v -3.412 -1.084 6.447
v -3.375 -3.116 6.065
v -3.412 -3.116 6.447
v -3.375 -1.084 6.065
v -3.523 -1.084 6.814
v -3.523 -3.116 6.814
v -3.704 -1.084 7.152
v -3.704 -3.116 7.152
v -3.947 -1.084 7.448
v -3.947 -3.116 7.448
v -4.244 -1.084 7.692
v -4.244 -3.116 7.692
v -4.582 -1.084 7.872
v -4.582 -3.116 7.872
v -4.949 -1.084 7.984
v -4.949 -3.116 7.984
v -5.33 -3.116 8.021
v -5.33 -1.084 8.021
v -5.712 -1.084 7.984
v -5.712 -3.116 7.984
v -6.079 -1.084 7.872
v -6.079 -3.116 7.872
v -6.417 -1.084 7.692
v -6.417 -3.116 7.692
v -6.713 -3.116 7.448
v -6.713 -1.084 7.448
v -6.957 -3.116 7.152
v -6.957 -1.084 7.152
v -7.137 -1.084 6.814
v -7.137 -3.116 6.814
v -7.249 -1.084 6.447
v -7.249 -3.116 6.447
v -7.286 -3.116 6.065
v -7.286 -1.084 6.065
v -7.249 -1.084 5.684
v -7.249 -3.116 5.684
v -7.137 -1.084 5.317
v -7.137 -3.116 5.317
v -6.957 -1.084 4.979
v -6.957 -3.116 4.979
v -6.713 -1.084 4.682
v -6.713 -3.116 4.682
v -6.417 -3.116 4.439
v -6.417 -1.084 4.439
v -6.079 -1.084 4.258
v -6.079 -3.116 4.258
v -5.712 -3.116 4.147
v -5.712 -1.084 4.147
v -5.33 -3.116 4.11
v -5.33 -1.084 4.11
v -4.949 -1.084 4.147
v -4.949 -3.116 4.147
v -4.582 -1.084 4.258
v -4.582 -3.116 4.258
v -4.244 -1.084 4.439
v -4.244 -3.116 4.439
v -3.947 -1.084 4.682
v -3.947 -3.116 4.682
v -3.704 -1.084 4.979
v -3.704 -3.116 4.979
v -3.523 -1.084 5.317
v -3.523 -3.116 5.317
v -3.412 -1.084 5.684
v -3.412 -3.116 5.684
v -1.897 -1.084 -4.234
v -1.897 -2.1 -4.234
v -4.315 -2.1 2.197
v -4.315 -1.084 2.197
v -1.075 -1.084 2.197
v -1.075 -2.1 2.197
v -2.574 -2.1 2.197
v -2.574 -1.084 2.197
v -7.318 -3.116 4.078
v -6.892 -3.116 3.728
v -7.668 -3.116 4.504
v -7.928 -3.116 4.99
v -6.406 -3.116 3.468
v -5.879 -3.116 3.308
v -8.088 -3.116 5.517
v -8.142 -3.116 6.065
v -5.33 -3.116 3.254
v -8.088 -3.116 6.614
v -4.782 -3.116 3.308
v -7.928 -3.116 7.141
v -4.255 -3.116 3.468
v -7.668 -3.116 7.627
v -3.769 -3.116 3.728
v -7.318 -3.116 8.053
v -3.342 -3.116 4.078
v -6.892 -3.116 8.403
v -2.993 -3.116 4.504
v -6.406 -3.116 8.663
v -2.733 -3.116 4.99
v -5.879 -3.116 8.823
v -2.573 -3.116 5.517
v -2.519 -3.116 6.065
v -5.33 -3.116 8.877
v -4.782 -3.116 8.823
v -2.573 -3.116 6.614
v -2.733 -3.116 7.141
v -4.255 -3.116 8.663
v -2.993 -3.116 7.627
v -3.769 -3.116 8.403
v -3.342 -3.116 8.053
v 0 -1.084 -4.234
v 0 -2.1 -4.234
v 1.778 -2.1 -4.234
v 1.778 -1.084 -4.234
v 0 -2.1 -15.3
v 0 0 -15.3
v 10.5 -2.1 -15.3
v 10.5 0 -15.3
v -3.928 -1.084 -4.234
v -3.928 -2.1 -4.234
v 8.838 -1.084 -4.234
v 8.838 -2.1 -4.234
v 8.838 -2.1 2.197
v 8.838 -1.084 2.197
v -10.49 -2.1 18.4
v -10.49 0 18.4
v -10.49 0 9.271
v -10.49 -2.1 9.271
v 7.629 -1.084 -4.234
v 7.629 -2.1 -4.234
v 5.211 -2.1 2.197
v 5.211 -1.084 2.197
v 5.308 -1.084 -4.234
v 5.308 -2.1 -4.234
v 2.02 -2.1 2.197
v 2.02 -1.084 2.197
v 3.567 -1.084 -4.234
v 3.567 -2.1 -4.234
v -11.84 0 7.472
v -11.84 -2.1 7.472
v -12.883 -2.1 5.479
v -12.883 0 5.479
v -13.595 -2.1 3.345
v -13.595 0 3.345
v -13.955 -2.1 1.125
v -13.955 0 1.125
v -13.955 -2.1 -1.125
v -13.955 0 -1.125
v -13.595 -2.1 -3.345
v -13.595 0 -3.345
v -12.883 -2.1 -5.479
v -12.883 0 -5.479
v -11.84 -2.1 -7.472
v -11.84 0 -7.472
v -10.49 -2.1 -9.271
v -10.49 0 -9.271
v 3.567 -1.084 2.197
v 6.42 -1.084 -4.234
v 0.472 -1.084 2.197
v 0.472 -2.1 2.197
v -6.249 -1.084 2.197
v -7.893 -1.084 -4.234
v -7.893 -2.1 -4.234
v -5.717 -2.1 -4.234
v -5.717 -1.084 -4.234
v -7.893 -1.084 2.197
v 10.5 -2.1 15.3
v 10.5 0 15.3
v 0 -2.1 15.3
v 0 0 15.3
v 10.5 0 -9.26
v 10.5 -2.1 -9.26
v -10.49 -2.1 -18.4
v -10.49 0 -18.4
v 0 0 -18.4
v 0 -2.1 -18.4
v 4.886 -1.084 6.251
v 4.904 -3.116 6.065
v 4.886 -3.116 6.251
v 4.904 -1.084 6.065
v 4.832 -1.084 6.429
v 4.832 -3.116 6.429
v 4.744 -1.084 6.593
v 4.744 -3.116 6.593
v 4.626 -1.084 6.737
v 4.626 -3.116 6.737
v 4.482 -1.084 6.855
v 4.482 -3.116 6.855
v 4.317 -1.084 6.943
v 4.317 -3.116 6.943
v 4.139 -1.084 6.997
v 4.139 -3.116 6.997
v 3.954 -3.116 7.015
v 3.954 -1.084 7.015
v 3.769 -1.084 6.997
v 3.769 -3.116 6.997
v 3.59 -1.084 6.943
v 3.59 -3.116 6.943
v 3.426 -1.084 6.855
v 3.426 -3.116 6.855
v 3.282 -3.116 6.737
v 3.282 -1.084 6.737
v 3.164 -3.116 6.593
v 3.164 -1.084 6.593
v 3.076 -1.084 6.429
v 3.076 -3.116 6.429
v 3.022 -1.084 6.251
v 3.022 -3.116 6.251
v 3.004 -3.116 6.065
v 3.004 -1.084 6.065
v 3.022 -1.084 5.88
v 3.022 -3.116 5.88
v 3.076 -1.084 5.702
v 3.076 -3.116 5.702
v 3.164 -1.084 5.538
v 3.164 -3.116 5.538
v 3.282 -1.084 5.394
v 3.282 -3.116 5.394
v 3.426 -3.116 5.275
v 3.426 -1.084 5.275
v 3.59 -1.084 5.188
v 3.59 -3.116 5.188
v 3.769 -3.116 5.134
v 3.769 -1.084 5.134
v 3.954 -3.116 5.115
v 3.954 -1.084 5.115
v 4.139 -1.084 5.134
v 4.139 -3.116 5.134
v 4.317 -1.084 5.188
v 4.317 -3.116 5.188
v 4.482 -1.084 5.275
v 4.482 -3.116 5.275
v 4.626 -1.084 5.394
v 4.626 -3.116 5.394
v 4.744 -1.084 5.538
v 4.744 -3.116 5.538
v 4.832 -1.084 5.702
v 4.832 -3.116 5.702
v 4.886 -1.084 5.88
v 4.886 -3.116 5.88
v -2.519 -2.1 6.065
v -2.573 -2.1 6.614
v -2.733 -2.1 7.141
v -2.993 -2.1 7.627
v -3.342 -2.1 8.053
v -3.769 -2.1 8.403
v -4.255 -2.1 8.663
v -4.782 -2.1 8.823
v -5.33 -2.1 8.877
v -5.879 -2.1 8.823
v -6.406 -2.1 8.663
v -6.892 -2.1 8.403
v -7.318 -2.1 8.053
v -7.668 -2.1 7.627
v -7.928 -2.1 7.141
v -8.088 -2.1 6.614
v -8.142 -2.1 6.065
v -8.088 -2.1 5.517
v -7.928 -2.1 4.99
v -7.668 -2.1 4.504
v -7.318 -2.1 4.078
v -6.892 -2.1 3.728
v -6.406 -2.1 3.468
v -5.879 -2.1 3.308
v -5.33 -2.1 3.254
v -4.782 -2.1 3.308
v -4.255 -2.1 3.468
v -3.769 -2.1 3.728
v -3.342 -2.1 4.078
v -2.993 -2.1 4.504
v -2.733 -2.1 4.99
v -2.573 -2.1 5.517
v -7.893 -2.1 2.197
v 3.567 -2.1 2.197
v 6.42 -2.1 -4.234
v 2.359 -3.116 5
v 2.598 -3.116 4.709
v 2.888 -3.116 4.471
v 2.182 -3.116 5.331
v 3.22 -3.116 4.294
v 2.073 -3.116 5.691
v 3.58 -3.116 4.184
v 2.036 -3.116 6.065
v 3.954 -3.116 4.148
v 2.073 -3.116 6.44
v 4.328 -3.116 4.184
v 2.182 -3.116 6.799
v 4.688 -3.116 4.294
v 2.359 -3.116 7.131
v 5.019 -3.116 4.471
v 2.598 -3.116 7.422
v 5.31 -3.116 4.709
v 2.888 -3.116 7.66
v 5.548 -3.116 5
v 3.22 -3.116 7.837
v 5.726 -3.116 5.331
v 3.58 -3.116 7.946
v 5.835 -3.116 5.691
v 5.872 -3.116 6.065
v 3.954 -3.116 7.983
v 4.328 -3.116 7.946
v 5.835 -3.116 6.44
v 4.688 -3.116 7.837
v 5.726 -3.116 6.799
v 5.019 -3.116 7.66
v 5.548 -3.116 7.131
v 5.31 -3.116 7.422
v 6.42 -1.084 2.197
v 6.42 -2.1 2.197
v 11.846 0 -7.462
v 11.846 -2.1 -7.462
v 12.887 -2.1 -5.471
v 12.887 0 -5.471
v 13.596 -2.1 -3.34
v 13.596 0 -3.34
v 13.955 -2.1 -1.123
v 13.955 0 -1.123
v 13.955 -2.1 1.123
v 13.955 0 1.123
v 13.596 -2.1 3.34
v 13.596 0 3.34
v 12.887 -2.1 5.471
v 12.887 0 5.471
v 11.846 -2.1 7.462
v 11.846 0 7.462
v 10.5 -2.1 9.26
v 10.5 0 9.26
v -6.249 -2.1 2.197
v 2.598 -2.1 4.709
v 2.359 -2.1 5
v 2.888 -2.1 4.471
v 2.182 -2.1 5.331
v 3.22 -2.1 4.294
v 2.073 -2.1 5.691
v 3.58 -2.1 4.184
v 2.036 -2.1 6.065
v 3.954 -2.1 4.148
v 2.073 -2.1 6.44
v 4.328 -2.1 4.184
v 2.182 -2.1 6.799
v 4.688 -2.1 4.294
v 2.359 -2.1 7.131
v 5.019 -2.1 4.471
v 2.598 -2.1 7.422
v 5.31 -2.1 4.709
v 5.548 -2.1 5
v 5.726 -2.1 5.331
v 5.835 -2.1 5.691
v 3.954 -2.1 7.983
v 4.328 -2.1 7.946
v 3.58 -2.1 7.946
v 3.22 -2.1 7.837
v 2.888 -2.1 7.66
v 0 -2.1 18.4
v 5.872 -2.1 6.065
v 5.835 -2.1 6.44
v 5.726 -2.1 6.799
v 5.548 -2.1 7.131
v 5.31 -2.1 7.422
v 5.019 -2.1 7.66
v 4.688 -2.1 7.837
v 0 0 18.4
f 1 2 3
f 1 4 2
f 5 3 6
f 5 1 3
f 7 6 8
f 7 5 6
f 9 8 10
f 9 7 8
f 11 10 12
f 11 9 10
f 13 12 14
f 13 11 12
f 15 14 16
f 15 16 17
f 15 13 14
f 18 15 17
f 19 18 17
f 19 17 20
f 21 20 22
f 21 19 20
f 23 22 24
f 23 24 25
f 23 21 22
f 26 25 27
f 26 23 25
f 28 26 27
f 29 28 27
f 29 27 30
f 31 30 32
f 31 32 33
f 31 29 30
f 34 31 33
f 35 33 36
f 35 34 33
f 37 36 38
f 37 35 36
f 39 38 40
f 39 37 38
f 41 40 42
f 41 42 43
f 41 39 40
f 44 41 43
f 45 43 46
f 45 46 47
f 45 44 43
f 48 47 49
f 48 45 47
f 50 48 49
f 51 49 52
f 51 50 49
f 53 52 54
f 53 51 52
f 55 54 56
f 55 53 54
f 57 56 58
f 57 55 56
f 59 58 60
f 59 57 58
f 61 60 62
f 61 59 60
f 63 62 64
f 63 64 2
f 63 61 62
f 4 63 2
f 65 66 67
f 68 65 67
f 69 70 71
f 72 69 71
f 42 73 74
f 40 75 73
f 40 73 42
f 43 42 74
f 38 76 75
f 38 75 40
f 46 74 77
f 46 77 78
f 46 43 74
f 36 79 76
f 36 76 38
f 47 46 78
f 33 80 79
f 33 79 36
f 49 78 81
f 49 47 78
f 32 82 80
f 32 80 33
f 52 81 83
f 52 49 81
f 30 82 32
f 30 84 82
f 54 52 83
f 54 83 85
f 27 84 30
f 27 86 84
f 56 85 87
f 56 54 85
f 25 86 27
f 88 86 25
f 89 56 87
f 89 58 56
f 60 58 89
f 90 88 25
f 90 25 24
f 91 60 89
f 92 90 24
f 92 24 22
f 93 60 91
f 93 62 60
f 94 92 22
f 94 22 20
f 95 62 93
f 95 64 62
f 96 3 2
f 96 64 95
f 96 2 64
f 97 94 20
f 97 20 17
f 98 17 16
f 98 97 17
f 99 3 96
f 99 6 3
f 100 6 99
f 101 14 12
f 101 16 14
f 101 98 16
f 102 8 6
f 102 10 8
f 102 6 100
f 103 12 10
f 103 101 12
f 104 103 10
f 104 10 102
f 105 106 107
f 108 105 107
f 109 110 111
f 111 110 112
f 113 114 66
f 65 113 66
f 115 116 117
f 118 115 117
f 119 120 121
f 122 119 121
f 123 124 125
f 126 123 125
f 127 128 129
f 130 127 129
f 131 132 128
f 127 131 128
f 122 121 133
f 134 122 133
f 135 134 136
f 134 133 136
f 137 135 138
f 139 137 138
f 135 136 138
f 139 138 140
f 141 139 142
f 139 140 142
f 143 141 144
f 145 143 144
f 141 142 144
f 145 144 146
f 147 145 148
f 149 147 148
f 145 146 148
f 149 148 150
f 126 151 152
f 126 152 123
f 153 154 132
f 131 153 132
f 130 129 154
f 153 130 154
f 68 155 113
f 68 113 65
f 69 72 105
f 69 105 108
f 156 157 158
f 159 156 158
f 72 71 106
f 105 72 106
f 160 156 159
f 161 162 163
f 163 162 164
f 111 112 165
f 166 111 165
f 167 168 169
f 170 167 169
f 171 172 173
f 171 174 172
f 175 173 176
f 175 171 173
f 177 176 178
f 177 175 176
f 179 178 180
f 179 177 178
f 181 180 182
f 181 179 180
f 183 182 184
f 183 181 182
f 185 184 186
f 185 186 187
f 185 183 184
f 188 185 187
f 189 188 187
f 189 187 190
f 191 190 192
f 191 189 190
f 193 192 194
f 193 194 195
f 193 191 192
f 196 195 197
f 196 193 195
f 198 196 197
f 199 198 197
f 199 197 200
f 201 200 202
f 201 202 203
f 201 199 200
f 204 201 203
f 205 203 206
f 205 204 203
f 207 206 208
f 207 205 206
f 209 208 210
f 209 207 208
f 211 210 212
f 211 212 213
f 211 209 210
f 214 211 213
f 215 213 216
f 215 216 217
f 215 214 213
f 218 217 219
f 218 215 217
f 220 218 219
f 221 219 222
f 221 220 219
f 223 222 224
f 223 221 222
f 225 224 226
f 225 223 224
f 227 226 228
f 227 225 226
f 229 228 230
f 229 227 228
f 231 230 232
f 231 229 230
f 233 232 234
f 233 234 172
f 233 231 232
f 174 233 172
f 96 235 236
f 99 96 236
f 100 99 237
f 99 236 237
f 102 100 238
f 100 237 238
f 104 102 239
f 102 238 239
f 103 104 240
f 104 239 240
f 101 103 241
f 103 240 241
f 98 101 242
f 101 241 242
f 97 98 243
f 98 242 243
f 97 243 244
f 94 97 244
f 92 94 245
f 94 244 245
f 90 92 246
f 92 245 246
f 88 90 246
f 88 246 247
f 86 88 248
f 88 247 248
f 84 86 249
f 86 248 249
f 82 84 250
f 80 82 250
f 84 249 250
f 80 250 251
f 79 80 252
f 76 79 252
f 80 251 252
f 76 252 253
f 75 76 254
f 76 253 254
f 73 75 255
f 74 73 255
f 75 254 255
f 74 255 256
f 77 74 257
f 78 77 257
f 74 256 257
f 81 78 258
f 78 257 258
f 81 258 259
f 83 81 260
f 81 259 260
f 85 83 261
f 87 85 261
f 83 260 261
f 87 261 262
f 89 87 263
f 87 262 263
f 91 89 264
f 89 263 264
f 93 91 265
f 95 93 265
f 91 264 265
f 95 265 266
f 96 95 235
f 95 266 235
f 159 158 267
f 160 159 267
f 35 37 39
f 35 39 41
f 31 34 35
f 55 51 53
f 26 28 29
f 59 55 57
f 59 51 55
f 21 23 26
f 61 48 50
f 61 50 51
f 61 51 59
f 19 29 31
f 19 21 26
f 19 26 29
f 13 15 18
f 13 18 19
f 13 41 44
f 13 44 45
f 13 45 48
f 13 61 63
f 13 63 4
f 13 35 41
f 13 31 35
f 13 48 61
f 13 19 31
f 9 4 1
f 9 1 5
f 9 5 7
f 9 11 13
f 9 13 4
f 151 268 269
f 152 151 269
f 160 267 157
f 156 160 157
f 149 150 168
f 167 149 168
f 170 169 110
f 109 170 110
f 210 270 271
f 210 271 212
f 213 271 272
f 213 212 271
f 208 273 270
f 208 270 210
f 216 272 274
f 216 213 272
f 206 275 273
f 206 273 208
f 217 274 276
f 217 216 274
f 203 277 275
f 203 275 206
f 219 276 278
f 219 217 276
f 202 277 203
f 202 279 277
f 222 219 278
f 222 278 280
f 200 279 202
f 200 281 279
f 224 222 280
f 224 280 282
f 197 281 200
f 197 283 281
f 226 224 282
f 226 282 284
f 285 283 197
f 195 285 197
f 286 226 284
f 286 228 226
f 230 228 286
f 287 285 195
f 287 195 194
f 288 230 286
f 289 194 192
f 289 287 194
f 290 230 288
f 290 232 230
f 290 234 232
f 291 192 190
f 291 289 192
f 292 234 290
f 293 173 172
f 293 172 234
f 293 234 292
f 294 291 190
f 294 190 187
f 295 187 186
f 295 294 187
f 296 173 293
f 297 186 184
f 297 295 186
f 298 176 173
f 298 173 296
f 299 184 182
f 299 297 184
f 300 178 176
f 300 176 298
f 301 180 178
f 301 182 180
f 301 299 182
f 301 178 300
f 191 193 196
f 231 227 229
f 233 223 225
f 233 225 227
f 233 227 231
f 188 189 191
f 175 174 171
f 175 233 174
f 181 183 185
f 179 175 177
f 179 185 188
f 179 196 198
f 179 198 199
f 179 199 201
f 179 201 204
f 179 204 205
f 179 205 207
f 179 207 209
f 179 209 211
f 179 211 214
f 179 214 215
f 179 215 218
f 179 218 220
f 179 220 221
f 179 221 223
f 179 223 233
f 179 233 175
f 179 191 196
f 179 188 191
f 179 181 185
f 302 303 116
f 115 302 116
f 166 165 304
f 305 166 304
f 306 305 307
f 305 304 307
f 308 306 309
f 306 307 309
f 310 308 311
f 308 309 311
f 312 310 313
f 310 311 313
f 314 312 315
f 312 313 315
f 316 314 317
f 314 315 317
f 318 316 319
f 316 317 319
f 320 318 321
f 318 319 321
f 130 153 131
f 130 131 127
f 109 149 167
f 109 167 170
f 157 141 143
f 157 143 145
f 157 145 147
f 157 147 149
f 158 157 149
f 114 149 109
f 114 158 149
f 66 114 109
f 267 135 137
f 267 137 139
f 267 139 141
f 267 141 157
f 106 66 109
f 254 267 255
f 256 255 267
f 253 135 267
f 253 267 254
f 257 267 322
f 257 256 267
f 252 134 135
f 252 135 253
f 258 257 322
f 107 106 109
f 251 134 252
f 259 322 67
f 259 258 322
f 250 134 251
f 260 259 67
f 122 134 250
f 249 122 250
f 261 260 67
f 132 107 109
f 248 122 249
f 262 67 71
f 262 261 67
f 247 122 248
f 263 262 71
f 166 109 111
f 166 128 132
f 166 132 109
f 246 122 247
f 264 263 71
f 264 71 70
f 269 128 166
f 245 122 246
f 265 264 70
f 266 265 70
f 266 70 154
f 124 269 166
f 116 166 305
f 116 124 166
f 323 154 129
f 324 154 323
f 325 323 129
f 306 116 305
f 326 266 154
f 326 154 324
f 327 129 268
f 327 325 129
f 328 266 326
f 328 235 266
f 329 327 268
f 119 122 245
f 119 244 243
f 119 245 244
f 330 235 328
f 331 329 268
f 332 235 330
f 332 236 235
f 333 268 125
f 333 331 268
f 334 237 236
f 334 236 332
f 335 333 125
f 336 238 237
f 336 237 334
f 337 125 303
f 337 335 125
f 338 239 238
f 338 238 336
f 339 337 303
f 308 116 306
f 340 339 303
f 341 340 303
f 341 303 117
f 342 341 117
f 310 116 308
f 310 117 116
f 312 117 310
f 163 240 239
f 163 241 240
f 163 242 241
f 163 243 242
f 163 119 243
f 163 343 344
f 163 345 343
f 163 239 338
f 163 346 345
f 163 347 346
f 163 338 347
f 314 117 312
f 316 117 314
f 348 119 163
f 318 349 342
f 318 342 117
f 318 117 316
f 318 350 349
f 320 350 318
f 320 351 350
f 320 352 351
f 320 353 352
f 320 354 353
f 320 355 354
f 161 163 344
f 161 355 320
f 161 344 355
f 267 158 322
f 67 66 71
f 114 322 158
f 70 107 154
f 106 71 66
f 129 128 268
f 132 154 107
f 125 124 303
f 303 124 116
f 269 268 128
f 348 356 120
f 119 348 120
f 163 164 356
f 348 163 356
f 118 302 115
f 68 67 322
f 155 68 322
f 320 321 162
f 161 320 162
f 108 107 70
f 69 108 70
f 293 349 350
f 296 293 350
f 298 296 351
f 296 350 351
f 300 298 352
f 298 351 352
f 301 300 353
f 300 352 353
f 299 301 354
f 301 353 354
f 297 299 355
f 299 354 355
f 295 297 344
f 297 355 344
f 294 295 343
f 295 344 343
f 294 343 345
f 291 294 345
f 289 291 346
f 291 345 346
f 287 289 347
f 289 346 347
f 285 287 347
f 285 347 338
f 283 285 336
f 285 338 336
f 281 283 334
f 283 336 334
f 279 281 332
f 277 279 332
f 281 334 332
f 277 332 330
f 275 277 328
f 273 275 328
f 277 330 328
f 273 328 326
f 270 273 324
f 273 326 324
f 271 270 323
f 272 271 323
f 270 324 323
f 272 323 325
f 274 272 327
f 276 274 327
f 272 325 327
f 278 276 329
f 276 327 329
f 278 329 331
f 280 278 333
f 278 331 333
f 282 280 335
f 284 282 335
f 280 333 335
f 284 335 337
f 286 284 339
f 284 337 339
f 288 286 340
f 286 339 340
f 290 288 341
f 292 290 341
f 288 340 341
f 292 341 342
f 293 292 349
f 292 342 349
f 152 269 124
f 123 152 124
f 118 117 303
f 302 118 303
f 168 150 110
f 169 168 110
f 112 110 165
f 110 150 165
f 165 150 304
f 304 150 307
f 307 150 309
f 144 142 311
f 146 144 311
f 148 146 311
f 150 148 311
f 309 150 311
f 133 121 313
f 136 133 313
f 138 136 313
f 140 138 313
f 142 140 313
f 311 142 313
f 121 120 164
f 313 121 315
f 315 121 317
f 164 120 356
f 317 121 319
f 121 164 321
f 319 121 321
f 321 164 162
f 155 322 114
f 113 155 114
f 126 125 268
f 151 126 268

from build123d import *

# Parameters (mm, degrees)
F1_DEPTH = 2.1
F2_R     = 1.955848
F2_R_2   = 0.950029
F3_DEPTH = 1.016
F2_R_3   = 2.811265
F2_R_4   = 1.91782
F4_DEPTH = 1.016


with BuildPart() as f1:
    # F0 (on Front) → F1 (new body)
    with BuildSketch(Plane.XZ):
        with BuildLine():
            Line((-10.4902, 18.4), (-10.4902, 9.27123))
            ThreePointArc((-10.4902, 9.27123), (-14, 0), (-10.4902, -9.27123))
            Line((-10.4902, -9.27123), (-10.4902, -18.4))
            Line((-10.4902, -18.4), (0, -18.4))
            Line((0, -18.4), (0, -15.3))
            Line((0, -15.3), (10.5, -15.3))
            Line((10.5, -15.3), (10.5, -9.26013))
            ThreePointArc((10.5, -9.26013), (14, 0), (10.5, 9.26013))
            Line((10.5, 9.26013), (10.5, 15.3))
            Line((10.5, 15.3), (0, 15.3))
            Line((0, 15.3), (0, 18.4))
            Line((0, 18.4), (-10.4902, 18.4))
        make_face()
    extrude(amount=F1_DEPTH)

    # F2 (on face) → F3 (cut)
    with BuildSketch(Plane.XZ.offset(2.1)):
        Polygon((-5.717198, -4.234256), (-7.893182, 2.19699), (-7.893182, -4.234256), align=None)
        Polygon((-4.314896, 2.19699), (-6.249105, 2.19699), (-3.928055, -4.234256), (-1.897135, -4.234256), align=None)
        Polygon((-1.075096, 2.19699), (-2.574108, 2.19699), (0, -4.234256), (1.777862, -4.234256), align=None)
        Polygon((2.019639, 2.19699), (0.472271, 2.19699), (3.567006, -4.234256), (5.307794, -4.234256), align=None)
        Polygon((5.211083, 2.19699), (3.567006, 2.19699), (6.419964, -4.234256), (7.628845, -4.234256), align=None)
        Polygon((8.837725, 2.19699), (6.419963, 2.19699), (8.837725, -4.234256), align=None)
        with Locations((-5.330356, 6.065408)):
            Circle(F2_R)
        with Locations((3.953848, 6.065408)):
            Circle(F2_R_2)
    extrude(amount=-F3_DEPTH, mode=Mode.SUBTRACT)

    # F2 (on face) → F4 (join)
    with BuildSketch(Plane.XZ.offset(2.1)):
        with Locations((-5.330356, 6.065408)):
            Circle(F2_R_3)
        with Locations((-5.330356, 6.065408)):
            Circle(F2_R, mode=Mode.SUBTRACT)
        with Locations((3.953848, 6.065408)):
            Circle(F2_R_4)
        with Locations((3.953848, 6.065408)):
            Circle(F2_R_2, mode=Mode.SUBTRACT)
    extrude(amount=F4_DEPTH)


solid = f1.part
